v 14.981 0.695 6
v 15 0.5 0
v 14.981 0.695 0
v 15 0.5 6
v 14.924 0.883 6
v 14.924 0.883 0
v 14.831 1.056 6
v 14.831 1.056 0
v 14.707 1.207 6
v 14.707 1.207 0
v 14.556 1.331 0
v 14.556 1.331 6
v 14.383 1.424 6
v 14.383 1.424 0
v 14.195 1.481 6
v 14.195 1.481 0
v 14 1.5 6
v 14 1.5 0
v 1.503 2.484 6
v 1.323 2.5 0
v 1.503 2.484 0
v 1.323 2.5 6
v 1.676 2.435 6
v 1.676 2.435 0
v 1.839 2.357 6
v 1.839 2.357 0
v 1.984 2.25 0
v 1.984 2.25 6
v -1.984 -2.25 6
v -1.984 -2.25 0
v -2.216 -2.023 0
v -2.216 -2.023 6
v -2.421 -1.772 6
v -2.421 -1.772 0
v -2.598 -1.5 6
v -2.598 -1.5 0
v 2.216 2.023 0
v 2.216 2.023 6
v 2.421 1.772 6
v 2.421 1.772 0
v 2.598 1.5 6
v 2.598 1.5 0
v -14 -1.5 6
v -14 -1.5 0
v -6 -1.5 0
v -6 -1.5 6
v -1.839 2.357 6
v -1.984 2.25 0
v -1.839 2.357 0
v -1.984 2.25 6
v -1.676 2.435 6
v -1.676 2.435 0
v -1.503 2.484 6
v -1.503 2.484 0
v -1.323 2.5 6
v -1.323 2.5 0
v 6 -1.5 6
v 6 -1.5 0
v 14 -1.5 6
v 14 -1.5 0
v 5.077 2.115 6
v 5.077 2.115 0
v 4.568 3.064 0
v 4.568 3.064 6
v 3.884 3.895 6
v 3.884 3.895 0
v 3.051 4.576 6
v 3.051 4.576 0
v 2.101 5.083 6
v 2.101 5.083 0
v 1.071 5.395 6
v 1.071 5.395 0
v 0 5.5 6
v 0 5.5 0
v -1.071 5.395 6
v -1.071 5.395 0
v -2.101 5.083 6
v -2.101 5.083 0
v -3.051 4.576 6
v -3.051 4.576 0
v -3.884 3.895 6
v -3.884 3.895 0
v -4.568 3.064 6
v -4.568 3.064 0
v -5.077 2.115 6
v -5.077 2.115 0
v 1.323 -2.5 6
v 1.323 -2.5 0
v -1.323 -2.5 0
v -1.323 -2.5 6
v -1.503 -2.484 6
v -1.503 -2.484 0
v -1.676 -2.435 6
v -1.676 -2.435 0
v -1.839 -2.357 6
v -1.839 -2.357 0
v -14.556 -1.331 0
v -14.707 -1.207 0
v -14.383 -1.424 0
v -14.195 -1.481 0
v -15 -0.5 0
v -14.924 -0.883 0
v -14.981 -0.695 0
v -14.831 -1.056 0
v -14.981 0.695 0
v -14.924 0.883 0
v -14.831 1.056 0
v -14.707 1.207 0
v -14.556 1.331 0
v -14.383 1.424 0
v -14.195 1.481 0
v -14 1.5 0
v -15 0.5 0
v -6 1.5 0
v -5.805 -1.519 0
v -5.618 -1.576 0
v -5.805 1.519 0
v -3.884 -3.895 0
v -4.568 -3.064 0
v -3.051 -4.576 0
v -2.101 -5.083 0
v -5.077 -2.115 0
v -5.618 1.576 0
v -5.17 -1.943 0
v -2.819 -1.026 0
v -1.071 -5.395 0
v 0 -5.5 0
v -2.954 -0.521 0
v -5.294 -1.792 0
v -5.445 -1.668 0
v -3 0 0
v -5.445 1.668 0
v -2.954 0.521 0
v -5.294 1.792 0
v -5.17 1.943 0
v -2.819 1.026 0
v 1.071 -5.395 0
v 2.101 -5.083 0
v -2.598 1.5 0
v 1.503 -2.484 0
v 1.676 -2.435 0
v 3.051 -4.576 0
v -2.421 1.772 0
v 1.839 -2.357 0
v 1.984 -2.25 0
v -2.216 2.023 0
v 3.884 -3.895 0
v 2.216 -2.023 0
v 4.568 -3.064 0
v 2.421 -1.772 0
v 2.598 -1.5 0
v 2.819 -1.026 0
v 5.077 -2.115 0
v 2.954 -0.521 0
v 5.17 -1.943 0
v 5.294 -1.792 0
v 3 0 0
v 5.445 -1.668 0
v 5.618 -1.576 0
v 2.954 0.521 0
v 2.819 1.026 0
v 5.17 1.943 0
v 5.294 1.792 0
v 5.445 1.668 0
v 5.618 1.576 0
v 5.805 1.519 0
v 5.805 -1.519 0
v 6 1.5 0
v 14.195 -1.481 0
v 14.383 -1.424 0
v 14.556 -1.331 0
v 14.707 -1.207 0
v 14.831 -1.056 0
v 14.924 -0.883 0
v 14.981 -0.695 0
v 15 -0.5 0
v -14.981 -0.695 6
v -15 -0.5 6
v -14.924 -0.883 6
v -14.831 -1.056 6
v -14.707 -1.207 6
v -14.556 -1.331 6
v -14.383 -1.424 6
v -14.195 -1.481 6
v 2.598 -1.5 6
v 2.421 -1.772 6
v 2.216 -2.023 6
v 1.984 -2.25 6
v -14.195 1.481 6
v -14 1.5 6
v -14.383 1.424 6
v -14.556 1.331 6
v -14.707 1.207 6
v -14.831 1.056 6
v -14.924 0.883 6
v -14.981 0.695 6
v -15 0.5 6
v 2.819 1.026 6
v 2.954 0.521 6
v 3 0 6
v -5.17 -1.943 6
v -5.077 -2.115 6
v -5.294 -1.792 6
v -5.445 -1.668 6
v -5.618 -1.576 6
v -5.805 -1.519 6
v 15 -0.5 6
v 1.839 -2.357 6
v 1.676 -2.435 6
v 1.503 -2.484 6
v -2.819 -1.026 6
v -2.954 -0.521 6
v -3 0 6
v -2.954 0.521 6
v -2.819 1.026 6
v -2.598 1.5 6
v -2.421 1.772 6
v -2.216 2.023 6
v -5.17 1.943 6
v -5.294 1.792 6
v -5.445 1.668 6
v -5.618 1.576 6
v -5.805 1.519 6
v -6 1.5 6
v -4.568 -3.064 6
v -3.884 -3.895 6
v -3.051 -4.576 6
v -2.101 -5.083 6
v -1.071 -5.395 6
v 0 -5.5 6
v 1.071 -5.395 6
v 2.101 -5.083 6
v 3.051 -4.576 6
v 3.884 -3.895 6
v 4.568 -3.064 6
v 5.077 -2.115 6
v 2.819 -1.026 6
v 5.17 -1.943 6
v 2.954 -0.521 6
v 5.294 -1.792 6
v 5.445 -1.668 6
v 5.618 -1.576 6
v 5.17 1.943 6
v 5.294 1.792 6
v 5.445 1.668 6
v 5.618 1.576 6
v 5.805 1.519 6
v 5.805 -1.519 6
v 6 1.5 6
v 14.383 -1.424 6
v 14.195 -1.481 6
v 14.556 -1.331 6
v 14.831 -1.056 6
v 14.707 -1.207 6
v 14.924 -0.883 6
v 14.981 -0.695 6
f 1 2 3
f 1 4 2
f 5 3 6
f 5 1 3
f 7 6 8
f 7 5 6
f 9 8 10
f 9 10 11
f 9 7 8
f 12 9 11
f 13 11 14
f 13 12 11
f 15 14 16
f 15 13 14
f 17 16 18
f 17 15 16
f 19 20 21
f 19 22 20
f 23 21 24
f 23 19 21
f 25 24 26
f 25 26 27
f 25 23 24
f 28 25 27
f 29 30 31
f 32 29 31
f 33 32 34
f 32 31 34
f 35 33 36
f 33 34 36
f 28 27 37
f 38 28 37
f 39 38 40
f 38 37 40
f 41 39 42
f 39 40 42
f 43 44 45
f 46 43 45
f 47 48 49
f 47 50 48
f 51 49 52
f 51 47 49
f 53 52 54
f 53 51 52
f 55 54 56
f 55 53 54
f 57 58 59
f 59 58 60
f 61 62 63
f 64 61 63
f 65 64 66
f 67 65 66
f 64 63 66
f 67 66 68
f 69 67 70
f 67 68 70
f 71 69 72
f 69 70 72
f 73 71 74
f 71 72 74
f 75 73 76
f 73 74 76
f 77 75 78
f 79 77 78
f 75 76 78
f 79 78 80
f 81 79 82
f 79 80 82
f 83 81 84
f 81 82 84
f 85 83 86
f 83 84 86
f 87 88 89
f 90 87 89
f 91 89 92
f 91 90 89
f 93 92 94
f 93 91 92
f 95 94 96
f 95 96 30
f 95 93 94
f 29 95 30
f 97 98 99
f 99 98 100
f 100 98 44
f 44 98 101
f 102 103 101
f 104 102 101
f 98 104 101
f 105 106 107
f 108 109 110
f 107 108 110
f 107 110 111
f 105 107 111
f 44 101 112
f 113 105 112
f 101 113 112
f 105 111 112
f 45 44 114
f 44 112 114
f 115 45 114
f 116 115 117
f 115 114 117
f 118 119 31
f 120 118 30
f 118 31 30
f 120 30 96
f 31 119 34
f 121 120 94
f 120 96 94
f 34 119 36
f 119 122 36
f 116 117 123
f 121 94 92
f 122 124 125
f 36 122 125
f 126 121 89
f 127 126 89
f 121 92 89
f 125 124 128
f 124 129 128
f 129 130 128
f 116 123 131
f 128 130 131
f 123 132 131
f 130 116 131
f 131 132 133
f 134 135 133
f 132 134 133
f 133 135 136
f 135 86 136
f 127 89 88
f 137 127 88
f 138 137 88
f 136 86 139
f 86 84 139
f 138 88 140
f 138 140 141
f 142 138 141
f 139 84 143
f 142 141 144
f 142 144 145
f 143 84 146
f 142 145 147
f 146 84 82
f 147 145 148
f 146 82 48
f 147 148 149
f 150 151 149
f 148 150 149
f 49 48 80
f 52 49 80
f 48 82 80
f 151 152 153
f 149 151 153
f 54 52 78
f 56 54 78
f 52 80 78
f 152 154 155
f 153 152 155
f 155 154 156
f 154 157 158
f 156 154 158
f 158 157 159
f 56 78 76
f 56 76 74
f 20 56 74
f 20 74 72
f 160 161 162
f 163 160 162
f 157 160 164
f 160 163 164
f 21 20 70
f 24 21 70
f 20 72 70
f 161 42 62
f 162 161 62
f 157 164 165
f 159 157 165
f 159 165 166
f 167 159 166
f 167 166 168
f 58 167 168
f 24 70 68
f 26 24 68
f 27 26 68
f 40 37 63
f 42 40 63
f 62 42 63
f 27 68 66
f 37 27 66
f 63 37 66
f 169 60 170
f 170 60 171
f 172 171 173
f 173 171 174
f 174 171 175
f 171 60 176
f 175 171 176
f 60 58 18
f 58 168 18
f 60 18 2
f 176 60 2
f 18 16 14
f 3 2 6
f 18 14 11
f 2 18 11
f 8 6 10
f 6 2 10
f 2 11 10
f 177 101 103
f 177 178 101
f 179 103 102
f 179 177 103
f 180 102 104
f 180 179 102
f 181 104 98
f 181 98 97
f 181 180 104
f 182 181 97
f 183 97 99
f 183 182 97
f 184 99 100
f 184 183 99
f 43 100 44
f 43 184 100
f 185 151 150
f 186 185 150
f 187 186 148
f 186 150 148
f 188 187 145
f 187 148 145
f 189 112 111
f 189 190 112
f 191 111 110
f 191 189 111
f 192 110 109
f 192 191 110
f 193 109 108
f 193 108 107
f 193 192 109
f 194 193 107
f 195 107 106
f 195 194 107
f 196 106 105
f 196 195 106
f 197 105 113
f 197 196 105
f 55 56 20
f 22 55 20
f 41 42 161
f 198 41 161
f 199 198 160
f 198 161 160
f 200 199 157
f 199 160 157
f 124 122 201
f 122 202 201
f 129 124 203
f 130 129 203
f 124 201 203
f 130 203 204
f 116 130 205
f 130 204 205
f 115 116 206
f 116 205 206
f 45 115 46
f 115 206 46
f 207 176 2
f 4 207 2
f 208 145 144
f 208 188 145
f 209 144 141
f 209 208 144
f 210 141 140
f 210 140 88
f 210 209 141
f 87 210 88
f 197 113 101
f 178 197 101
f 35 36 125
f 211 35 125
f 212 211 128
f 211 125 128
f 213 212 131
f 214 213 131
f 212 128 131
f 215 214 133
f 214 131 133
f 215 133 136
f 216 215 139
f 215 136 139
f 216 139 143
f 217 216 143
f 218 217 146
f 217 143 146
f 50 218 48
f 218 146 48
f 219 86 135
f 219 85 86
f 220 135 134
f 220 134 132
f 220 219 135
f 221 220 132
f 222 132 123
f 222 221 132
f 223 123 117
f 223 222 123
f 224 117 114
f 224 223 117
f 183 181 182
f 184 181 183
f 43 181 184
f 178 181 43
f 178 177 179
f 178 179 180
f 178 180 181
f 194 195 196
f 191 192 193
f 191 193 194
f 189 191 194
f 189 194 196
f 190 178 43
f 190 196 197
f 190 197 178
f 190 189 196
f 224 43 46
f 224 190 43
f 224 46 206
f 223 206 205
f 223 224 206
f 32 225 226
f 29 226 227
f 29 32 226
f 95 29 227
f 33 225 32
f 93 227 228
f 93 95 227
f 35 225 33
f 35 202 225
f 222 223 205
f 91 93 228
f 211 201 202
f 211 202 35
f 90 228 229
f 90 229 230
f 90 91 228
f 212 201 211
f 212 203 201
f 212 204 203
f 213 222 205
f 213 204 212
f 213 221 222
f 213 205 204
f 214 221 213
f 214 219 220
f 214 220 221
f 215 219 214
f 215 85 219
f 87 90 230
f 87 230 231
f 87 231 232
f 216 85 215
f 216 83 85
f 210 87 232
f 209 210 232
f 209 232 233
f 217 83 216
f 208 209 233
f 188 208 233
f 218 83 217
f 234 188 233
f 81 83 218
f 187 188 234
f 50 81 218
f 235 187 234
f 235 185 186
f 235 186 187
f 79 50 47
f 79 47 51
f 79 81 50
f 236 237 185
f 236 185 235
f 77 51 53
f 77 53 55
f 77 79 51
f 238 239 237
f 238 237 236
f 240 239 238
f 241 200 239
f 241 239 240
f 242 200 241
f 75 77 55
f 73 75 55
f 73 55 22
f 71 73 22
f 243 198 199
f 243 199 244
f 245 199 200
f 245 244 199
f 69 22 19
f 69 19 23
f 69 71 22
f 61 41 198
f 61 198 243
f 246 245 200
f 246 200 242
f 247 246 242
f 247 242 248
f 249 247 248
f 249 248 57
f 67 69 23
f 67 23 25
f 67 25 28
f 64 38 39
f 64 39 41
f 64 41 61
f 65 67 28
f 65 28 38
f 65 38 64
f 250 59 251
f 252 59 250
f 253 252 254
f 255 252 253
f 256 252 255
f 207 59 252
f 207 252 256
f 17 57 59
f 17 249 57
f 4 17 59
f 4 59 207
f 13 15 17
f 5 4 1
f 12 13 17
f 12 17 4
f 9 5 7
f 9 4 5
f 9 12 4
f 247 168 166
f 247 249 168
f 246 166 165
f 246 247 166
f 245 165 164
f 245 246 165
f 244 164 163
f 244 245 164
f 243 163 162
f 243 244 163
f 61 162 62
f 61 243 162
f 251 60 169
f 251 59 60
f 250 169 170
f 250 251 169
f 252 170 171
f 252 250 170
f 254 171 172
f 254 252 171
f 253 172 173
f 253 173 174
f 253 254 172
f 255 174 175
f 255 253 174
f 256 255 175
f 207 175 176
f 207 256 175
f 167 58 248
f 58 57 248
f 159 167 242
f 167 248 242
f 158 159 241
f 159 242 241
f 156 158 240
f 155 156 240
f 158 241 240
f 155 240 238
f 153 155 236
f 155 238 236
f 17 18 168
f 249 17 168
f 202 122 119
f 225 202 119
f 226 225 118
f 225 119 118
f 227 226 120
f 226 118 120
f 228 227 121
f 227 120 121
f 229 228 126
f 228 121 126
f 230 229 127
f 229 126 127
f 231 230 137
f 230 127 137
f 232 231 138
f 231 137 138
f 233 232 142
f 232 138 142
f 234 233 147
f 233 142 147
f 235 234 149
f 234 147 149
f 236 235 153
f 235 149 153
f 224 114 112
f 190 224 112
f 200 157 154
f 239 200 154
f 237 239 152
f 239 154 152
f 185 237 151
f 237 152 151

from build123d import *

# Parameters (mm, degrees)
F1_DEPTH = 6
F2_R     = 1
F3_R     = 1


with BuildPart() as f1:
    # F0 (on Top) → F1 (new body)
    with BuildSketch(Plane.XY):
        with BuildLine():
            ThreePointArc((-5.2915026221, -1.5), (0, -5.5), (5.2915026221, -1.5))
            Line((5.2915026221, -1.5), (2.5980762114, -1.5))
            ThreePointArc((2.5980762114, -1.5), (2.1861406616, -2.0544558909), (1.6583123952, -2.5))
            ThreePointArc((1.6583123952, -2.5), (0, -3), (-1.6583123952, -2.5))
            ThreePointArc((-1.6583123952, -2.5), (-2.1861406616, -2.0544558909), (-2.5980762114, -1.5))
            Line((-2.5980762114, -1.5), (-5.2915026221, -1.5))
        make_face()
        with BuildLine():
            ThreePointArc((-5.2915026221, -1.5), (-5.5, 0), (-5.2915026221, 1.5))
            Line((-5.2915026221, 1.5), (-15, 1.5))
            Line((-15, 1.5), (-15, -1.5))
            Line((-15, -1.5), (-5.2915026221, -1.5))
        make_face()
        with BuildLine():
            Line((-2.5980762114, 1.5), (-5.2915026221, 1.5))
            ThreePointArc((-5.2915026221, 1.5), (-5.5, 0), (-5.2915026221, -1.5))
            Line((-5.2915026221, -1.5), (-2.5980762114, -1.5))
            ThreePointArc((-2.5980762114, -1.5), (-3, 0), (-2.5980762114, 1.5))
        make_face()
        with BuildLine():
            ThreePointArc((5.2915026221, 1.5), (5.4476262914, 0.7572105316), (5.5, 0))
            ThreePointArc((5.5, 0), (5.4476262914, -0.7572105316), (5.2915026221, -1.5))
            Line((5.2915026221, -1.5), (15, -1.5))
            Line((15, -1.5), (15, 1.5))
            Line((15, 1.5), (5.2915026221, 1.5))
        make_face()
        with BuildLine():
            ThreePointArc((5.2915026221, -1.5), (5.4476262914, -0.7572105316), (5.5, 0))
            ThreePointArc((5.5, 0), (5.4476262914, 0.7572105316), (5.2915026221, 1.5))
            Line((5.2915026221, 1.5), (2.5980762114, 1.5))
            ThreePointArc((2.5980762114, 1.5), (2.8977774789, 0.7764571353), (3, 0))
            ThreePointArc((3, 0), (2.8977774789, -0.7764571353), (2.5980762114, -1.5))
            Line((2.5980762114, -1.5), (5.2915026221, -1.5))
        make_face()
        with BuildLine():
            Line((2.5980762114, 1.5), (5.2915026221, 1.5))
            ThreePointArc((5.2915026221, 1.5), (0, 5.5), (-5.2915026221, 1.5))
            Line((-5.2915026221, 1.5), (-2.5980762114, 1.5))
            ThreePointArc((-2.5980762114, 1.5), (-2.1861406616, 2.0544558909), (-1.6583123952, 2.5))
            ThreePointArc((-1.6583123952, 2.5), (0, 3), (1.6583123952, 2.5))
            ThreePointArc((1.6583123952, 2.5), (2.1861406616, 2.0544558909), (2.5980762114, 1.5))
        make_face()
        with BuildLine():
            Line((-1.6583123952, 2.5), (1.6583123952, 2.5))
            ThreePointArc((1.6583123952, 2.5), (0, 3), (-1.6583123952, 2.5))
        make_face()
        with BuildLine():
            ThreePointArc((-1.6583123952, -2.5), (0, -3), (1.6583123952, -2.5))
            Line((1.6583123952, -2.5), (-1.6583123952, -2.5))
        make_face()
    extrude(amount=F1_DEPTH)

    # F2
    f2_edges = [f1.edges().sort_by_distance(p)[0] for p in [
        (15, -1.5, 3),
        (-15, -1.5, 3),
        (15, 1.5, 3),
        (-15, 1.5, 3),
    ]]
    fillet(f2_edges, radius=F2_R)

    # F3
    f3_edges = [f1.edges().sort_by_distance(p)[0] for p in [
        (5.291503, -1.5, 3),
        (-5.291503, -1.5, 3),
        (-5.291503, 1.5, 3),
        (5.291503, 1.5, 3),
        (-1.658312, 2.5, 3),
        (1.658312, -2.5, 3),
        (1.658312, 2.5, 3),
        (-1.658312, -2.5, 3),
    ]]
    fillet(f3_edges, radius=F3_R)


solid = f1.part
